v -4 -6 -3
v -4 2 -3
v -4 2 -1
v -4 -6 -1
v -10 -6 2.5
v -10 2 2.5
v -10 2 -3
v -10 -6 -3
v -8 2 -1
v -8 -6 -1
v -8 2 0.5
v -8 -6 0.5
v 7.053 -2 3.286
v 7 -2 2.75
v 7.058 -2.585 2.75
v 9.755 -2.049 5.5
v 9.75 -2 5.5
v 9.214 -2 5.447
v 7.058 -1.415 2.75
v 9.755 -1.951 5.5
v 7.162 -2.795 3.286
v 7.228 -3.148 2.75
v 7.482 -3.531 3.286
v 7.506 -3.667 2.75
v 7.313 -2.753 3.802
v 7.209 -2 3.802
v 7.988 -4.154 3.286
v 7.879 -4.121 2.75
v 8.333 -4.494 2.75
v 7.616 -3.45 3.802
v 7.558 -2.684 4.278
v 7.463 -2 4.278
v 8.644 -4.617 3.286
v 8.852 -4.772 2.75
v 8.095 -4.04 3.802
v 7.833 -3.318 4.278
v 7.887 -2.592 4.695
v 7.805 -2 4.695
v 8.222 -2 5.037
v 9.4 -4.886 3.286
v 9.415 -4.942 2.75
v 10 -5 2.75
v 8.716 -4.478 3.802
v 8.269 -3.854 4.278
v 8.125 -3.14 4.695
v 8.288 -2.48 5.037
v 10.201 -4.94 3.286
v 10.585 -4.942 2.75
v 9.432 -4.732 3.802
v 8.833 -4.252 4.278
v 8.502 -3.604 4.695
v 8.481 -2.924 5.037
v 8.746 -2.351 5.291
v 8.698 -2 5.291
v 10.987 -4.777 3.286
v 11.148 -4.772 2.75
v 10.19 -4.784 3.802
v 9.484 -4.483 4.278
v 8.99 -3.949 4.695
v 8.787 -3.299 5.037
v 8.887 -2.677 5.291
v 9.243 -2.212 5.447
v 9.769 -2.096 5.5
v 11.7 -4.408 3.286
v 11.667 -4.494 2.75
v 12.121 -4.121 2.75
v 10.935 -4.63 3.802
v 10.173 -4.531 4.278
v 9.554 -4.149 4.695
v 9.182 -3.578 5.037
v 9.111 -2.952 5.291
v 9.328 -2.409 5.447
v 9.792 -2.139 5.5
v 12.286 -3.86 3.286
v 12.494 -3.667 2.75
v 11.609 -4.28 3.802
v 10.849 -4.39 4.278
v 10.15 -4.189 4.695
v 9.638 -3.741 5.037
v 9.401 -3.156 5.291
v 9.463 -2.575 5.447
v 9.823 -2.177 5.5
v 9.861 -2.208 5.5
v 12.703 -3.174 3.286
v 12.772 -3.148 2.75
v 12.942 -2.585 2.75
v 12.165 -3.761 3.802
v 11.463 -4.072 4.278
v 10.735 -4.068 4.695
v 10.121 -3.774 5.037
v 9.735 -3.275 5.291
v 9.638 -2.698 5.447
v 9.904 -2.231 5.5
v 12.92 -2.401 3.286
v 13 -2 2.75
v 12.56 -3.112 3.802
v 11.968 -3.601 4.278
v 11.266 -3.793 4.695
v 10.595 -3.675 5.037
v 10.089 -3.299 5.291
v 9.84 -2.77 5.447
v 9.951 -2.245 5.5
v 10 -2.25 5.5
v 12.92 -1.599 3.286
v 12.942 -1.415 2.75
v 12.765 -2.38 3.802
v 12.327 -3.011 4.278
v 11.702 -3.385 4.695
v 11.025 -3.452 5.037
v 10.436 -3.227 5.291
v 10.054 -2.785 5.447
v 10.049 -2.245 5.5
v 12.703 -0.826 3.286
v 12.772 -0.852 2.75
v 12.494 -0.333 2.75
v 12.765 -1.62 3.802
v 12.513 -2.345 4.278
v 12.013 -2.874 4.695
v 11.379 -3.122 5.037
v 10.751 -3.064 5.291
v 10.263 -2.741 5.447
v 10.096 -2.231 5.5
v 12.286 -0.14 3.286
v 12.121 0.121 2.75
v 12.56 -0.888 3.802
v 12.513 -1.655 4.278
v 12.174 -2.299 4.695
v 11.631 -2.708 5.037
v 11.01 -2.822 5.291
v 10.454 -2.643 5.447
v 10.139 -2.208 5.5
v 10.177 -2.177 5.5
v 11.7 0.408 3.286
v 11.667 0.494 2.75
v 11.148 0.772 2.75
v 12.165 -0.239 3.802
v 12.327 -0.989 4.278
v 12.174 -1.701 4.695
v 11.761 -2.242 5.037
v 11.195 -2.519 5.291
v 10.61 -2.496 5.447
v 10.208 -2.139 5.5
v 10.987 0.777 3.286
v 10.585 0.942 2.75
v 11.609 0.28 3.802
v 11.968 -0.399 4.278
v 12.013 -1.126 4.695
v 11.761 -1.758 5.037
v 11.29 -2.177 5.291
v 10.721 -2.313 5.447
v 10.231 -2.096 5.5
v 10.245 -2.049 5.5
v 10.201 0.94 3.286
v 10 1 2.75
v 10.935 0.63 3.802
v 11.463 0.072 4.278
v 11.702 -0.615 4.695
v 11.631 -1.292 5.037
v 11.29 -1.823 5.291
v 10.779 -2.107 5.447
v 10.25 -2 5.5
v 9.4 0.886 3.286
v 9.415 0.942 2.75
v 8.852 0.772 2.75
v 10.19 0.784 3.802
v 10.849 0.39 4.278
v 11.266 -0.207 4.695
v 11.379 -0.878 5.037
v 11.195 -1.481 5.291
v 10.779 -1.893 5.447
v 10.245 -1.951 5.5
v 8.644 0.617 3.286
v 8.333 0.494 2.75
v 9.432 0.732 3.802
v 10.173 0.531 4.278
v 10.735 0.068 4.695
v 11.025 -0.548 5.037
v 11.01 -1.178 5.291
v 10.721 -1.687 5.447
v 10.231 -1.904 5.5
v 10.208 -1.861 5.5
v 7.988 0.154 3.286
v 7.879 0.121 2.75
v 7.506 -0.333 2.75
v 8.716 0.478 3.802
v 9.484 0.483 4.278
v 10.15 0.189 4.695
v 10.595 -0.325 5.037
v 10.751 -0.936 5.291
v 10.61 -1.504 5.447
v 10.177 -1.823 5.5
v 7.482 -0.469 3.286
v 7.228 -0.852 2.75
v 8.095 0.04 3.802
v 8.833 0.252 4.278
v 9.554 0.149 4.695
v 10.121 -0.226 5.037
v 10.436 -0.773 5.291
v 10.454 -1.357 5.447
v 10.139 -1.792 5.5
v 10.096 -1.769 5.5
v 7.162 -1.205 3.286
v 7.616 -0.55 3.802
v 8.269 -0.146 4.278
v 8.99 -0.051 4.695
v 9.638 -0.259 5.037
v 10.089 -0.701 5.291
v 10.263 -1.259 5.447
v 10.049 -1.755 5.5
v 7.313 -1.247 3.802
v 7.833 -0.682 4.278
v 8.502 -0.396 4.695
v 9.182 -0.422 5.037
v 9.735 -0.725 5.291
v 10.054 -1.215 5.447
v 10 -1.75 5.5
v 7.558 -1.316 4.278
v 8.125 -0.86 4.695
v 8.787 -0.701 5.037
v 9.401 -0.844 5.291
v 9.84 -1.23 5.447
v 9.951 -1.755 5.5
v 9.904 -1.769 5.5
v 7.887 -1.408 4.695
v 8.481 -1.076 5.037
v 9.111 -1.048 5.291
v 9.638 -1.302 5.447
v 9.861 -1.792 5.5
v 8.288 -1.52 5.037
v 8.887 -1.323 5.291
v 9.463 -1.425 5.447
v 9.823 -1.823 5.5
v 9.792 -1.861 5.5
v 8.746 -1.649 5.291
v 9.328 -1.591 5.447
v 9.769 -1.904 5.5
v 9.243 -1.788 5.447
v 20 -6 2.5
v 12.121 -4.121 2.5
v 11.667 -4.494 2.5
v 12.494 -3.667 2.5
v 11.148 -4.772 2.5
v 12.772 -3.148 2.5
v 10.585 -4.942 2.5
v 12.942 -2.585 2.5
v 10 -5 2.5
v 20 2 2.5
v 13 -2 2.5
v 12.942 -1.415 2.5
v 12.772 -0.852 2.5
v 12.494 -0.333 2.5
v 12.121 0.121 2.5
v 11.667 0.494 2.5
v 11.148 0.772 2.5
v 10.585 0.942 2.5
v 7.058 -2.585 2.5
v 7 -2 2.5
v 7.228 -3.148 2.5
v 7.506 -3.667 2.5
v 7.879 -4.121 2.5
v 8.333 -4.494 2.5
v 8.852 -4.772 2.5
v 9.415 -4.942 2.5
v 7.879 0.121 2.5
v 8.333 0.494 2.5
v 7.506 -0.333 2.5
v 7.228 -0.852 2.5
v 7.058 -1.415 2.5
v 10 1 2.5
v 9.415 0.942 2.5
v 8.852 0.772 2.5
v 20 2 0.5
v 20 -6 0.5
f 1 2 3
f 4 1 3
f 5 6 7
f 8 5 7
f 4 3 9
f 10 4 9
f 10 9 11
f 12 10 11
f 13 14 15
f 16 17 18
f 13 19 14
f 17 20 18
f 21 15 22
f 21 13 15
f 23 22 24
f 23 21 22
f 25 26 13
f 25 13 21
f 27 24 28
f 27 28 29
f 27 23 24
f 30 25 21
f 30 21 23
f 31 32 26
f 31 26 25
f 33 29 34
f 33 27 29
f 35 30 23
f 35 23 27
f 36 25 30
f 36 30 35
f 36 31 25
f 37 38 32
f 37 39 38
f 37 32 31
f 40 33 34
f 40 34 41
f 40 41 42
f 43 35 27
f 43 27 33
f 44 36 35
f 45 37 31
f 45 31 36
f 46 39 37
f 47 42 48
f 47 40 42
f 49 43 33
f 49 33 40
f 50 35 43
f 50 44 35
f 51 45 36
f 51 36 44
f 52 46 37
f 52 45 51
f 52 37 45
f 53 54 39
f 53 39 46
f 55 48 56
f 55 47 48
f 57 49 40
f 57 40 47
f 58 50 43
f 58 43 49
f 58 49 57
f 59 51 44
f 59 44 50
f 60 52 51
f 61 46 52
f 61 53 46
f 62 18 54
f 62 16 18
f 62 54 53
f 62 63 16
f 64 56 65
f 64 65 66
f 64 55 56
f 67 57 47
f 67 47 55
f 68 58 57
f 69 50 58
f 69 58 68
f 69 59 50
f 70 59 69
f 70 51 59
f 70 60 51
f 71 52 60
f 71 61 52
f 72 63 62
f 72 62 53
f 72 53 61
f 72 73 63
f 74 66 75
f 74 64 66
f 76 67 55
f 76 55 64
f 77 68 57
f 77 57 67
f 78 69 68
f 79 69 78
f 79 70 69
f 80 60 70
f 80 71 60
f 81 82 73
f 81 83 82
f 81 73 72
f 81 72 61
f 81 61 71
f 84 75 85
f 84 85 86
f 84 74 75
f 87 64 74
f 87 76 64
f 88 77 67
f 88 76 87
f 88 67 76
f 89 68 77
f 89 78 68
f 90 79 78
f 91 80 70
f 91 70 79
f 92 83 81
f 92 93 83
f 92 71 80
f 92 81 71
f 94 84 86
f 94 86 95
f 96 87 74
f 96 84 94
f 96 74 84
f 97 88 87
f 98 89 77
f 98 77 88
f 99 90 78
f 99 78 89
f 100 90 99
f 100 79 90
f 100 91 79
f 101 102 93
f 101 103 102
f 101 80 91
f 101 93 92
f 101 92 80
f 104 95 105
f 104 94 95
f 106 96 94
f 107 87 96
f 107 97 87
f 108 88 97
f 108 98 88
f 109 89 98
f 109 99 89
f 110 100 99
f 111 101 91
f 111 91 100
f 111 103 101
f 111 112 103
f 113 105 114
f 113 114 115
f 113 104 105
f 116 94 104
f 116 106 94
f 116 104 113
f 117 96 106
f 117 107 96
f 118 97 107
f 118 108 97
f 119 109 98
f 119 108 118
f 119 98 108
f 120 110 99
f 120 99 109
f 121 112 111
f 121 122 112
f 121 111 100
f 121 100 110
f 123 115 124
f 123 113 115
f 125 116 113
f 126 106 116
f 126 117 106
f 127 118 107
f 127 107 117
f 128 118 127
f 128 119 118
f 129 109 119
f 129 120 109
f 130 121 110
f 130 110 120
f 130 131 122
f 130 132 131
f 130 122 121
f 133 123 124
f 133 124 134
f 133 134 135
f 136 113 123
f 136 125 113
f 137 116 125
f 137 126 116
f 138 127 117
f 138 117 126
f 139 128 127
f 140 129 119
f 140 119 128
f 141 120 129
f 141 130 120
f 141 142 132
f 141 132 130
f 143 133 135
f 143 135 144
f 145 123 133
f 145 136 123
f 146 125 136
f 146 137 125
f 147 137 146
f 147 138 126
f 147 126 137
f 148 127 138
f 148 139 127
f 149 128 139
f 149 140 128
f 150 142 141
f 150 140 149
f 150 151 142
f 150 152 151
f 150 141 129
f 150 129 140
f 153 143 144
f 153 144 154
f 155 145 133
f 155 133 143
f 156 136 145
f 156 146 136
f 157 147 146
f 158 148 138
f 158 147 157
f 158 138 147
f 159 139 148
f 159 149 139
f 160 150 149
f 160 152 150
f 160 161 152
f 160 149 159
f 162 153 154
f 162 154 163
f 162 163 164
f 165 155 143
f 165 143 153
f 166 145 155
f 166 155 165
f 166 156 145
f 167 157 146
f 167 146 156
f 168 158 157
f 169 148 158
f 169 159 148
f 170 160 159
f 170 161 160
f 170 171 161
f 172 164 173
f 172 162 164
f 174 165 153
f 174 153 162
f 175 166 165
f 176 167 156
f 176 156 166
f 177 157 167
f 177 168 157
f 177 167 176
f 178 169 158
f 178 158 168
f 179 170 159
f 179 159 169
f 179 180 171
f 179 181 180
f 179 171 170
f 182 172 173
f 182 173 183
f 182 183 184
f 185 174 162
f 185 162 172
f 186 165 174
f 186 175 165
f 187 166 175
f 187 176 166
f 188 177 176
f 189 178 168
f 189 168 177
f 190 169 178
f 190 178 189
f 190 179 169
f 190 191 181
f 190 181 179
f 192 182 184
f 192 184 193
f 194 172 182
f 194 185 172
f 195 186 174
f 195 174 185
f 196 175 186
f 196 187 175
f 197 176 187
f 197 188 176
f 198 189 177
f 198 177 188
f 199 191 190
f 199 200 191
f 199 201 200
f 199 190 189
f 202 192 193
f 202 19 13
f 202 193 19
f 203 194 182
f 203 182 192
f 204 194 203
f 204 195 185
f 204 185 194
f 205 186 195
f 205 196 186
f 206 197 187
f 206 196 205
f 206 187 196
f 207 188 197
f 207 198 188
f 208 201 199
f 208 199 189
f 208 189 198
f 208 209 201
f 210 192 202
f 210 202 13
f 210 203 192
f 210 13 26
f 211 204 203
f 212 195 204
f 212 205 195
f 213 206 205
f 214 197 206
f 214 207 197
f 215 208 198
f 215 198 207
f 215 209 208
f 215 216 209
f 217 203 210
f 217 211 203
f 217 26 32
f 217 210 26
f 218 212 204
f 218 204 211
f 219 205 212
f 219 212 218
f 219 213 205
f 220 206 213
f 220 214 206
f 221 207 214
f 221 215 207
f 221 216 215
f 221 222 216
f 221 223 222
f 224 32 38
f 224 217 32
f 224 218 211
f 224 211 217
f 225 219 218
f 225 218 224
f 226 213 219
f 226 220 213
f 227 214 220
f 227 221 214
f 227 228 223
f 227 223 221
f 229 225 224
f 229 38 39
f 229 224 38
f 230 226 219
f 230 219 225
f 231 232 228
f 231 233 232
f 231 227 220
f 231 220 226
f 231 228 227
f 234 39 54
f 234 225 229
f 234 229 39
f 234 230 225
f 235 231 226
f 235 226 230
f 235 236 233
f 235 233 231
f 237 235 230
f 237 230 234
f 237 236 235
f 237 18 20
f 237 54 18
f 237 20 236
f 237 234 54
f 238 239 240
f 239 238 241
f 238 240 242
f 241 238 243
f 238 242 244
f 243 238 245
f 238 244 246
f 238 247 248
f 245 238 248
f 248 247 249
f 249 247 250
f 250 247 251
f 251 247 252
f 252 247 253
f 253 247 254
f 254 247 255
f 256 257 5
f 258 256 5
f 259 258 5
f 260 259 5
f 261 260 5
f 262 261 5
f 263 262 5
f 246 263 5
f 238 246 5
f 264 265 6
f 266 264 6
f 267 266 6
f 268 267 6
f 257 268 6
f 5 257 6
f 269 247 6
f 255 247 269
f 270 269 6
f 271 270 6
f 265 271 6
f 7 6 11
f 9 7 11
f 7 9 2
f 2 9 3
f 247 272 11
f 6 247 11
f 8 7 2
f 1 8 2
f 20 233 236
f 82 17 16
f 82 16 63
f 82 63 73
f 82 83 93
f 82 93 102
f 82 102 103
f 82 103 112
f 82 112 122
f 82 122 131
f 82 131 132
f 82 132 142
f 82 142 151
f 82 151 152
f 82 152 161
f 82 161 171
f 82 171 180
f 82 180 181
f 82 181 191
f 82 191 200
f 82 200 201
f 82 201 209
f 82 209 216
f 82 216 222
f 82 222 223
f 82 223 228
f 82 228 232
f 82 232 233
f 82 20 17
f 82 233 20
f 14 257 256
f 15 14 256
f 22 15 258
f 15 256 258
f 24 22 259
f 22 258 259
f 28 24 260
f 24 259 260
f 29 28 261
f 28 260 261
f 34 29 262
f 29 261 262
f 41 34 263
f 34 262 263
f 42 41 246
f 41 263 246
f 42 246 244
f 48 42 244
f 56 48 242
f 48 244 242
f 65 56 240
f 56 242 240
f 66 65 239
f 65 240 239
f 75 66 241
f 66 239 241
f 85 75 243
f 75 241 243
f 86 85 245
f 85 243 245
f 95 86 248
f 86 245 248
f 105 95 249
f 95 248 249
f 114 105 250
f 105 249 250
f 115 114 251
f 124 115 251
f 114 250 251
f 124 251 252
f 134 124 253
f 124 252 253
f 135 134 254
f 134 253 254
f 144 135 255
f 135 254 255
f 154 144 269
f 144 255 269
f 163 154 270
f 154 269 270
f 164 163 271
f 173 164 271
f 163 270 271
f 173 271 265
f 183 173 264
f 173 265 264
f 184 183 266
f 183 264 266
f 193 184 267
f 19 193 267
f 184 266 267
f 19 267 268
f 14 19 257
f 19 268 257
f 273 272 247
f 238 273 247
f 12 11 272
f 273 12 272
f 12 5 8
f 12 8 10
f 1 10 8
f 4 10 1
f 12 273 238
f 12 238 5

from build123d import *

# Parameters (mm, degrees)
PAD002_DEPTH = 8
SKETCH_R     = 3
PAD_DEPTH    = 3
FILLET_R     = 2.75


with BuildPart() as part:
    # Sketch002 → Pad002 (new body)
    with BuildSketch(Plane.XZ.offset(-2)):
        Polygon((20, 0.5), (20, 2.5), (-10, 2.5), (-10, 0.547361), (-10, -3), (-4, -3), (-4, -1), (-8, -1), (-8, 0.5), align=None)
    extrude(amount=PAD002_DEPTH)

    # Sketch (on Face2 of Pad002) → Pad (join)
    with BuildSketch(Plane(origin=(0, 2, 2.5), x_dir=(-1, 0, 0), z_dir=(0, 0, 1))):
        with Locations((-10, 4)):
            Circle(SKETCH_R)
    extrude(amount=PAD_DEPTH)

    # Fillet
    fillet_edges = [part.edges().sort_by_distance(p)[0] for p in [
        (13, -2, 5.5),
    ]]
    fillet(fillet_edges, radius=FILLET_R)


solid = part.part
